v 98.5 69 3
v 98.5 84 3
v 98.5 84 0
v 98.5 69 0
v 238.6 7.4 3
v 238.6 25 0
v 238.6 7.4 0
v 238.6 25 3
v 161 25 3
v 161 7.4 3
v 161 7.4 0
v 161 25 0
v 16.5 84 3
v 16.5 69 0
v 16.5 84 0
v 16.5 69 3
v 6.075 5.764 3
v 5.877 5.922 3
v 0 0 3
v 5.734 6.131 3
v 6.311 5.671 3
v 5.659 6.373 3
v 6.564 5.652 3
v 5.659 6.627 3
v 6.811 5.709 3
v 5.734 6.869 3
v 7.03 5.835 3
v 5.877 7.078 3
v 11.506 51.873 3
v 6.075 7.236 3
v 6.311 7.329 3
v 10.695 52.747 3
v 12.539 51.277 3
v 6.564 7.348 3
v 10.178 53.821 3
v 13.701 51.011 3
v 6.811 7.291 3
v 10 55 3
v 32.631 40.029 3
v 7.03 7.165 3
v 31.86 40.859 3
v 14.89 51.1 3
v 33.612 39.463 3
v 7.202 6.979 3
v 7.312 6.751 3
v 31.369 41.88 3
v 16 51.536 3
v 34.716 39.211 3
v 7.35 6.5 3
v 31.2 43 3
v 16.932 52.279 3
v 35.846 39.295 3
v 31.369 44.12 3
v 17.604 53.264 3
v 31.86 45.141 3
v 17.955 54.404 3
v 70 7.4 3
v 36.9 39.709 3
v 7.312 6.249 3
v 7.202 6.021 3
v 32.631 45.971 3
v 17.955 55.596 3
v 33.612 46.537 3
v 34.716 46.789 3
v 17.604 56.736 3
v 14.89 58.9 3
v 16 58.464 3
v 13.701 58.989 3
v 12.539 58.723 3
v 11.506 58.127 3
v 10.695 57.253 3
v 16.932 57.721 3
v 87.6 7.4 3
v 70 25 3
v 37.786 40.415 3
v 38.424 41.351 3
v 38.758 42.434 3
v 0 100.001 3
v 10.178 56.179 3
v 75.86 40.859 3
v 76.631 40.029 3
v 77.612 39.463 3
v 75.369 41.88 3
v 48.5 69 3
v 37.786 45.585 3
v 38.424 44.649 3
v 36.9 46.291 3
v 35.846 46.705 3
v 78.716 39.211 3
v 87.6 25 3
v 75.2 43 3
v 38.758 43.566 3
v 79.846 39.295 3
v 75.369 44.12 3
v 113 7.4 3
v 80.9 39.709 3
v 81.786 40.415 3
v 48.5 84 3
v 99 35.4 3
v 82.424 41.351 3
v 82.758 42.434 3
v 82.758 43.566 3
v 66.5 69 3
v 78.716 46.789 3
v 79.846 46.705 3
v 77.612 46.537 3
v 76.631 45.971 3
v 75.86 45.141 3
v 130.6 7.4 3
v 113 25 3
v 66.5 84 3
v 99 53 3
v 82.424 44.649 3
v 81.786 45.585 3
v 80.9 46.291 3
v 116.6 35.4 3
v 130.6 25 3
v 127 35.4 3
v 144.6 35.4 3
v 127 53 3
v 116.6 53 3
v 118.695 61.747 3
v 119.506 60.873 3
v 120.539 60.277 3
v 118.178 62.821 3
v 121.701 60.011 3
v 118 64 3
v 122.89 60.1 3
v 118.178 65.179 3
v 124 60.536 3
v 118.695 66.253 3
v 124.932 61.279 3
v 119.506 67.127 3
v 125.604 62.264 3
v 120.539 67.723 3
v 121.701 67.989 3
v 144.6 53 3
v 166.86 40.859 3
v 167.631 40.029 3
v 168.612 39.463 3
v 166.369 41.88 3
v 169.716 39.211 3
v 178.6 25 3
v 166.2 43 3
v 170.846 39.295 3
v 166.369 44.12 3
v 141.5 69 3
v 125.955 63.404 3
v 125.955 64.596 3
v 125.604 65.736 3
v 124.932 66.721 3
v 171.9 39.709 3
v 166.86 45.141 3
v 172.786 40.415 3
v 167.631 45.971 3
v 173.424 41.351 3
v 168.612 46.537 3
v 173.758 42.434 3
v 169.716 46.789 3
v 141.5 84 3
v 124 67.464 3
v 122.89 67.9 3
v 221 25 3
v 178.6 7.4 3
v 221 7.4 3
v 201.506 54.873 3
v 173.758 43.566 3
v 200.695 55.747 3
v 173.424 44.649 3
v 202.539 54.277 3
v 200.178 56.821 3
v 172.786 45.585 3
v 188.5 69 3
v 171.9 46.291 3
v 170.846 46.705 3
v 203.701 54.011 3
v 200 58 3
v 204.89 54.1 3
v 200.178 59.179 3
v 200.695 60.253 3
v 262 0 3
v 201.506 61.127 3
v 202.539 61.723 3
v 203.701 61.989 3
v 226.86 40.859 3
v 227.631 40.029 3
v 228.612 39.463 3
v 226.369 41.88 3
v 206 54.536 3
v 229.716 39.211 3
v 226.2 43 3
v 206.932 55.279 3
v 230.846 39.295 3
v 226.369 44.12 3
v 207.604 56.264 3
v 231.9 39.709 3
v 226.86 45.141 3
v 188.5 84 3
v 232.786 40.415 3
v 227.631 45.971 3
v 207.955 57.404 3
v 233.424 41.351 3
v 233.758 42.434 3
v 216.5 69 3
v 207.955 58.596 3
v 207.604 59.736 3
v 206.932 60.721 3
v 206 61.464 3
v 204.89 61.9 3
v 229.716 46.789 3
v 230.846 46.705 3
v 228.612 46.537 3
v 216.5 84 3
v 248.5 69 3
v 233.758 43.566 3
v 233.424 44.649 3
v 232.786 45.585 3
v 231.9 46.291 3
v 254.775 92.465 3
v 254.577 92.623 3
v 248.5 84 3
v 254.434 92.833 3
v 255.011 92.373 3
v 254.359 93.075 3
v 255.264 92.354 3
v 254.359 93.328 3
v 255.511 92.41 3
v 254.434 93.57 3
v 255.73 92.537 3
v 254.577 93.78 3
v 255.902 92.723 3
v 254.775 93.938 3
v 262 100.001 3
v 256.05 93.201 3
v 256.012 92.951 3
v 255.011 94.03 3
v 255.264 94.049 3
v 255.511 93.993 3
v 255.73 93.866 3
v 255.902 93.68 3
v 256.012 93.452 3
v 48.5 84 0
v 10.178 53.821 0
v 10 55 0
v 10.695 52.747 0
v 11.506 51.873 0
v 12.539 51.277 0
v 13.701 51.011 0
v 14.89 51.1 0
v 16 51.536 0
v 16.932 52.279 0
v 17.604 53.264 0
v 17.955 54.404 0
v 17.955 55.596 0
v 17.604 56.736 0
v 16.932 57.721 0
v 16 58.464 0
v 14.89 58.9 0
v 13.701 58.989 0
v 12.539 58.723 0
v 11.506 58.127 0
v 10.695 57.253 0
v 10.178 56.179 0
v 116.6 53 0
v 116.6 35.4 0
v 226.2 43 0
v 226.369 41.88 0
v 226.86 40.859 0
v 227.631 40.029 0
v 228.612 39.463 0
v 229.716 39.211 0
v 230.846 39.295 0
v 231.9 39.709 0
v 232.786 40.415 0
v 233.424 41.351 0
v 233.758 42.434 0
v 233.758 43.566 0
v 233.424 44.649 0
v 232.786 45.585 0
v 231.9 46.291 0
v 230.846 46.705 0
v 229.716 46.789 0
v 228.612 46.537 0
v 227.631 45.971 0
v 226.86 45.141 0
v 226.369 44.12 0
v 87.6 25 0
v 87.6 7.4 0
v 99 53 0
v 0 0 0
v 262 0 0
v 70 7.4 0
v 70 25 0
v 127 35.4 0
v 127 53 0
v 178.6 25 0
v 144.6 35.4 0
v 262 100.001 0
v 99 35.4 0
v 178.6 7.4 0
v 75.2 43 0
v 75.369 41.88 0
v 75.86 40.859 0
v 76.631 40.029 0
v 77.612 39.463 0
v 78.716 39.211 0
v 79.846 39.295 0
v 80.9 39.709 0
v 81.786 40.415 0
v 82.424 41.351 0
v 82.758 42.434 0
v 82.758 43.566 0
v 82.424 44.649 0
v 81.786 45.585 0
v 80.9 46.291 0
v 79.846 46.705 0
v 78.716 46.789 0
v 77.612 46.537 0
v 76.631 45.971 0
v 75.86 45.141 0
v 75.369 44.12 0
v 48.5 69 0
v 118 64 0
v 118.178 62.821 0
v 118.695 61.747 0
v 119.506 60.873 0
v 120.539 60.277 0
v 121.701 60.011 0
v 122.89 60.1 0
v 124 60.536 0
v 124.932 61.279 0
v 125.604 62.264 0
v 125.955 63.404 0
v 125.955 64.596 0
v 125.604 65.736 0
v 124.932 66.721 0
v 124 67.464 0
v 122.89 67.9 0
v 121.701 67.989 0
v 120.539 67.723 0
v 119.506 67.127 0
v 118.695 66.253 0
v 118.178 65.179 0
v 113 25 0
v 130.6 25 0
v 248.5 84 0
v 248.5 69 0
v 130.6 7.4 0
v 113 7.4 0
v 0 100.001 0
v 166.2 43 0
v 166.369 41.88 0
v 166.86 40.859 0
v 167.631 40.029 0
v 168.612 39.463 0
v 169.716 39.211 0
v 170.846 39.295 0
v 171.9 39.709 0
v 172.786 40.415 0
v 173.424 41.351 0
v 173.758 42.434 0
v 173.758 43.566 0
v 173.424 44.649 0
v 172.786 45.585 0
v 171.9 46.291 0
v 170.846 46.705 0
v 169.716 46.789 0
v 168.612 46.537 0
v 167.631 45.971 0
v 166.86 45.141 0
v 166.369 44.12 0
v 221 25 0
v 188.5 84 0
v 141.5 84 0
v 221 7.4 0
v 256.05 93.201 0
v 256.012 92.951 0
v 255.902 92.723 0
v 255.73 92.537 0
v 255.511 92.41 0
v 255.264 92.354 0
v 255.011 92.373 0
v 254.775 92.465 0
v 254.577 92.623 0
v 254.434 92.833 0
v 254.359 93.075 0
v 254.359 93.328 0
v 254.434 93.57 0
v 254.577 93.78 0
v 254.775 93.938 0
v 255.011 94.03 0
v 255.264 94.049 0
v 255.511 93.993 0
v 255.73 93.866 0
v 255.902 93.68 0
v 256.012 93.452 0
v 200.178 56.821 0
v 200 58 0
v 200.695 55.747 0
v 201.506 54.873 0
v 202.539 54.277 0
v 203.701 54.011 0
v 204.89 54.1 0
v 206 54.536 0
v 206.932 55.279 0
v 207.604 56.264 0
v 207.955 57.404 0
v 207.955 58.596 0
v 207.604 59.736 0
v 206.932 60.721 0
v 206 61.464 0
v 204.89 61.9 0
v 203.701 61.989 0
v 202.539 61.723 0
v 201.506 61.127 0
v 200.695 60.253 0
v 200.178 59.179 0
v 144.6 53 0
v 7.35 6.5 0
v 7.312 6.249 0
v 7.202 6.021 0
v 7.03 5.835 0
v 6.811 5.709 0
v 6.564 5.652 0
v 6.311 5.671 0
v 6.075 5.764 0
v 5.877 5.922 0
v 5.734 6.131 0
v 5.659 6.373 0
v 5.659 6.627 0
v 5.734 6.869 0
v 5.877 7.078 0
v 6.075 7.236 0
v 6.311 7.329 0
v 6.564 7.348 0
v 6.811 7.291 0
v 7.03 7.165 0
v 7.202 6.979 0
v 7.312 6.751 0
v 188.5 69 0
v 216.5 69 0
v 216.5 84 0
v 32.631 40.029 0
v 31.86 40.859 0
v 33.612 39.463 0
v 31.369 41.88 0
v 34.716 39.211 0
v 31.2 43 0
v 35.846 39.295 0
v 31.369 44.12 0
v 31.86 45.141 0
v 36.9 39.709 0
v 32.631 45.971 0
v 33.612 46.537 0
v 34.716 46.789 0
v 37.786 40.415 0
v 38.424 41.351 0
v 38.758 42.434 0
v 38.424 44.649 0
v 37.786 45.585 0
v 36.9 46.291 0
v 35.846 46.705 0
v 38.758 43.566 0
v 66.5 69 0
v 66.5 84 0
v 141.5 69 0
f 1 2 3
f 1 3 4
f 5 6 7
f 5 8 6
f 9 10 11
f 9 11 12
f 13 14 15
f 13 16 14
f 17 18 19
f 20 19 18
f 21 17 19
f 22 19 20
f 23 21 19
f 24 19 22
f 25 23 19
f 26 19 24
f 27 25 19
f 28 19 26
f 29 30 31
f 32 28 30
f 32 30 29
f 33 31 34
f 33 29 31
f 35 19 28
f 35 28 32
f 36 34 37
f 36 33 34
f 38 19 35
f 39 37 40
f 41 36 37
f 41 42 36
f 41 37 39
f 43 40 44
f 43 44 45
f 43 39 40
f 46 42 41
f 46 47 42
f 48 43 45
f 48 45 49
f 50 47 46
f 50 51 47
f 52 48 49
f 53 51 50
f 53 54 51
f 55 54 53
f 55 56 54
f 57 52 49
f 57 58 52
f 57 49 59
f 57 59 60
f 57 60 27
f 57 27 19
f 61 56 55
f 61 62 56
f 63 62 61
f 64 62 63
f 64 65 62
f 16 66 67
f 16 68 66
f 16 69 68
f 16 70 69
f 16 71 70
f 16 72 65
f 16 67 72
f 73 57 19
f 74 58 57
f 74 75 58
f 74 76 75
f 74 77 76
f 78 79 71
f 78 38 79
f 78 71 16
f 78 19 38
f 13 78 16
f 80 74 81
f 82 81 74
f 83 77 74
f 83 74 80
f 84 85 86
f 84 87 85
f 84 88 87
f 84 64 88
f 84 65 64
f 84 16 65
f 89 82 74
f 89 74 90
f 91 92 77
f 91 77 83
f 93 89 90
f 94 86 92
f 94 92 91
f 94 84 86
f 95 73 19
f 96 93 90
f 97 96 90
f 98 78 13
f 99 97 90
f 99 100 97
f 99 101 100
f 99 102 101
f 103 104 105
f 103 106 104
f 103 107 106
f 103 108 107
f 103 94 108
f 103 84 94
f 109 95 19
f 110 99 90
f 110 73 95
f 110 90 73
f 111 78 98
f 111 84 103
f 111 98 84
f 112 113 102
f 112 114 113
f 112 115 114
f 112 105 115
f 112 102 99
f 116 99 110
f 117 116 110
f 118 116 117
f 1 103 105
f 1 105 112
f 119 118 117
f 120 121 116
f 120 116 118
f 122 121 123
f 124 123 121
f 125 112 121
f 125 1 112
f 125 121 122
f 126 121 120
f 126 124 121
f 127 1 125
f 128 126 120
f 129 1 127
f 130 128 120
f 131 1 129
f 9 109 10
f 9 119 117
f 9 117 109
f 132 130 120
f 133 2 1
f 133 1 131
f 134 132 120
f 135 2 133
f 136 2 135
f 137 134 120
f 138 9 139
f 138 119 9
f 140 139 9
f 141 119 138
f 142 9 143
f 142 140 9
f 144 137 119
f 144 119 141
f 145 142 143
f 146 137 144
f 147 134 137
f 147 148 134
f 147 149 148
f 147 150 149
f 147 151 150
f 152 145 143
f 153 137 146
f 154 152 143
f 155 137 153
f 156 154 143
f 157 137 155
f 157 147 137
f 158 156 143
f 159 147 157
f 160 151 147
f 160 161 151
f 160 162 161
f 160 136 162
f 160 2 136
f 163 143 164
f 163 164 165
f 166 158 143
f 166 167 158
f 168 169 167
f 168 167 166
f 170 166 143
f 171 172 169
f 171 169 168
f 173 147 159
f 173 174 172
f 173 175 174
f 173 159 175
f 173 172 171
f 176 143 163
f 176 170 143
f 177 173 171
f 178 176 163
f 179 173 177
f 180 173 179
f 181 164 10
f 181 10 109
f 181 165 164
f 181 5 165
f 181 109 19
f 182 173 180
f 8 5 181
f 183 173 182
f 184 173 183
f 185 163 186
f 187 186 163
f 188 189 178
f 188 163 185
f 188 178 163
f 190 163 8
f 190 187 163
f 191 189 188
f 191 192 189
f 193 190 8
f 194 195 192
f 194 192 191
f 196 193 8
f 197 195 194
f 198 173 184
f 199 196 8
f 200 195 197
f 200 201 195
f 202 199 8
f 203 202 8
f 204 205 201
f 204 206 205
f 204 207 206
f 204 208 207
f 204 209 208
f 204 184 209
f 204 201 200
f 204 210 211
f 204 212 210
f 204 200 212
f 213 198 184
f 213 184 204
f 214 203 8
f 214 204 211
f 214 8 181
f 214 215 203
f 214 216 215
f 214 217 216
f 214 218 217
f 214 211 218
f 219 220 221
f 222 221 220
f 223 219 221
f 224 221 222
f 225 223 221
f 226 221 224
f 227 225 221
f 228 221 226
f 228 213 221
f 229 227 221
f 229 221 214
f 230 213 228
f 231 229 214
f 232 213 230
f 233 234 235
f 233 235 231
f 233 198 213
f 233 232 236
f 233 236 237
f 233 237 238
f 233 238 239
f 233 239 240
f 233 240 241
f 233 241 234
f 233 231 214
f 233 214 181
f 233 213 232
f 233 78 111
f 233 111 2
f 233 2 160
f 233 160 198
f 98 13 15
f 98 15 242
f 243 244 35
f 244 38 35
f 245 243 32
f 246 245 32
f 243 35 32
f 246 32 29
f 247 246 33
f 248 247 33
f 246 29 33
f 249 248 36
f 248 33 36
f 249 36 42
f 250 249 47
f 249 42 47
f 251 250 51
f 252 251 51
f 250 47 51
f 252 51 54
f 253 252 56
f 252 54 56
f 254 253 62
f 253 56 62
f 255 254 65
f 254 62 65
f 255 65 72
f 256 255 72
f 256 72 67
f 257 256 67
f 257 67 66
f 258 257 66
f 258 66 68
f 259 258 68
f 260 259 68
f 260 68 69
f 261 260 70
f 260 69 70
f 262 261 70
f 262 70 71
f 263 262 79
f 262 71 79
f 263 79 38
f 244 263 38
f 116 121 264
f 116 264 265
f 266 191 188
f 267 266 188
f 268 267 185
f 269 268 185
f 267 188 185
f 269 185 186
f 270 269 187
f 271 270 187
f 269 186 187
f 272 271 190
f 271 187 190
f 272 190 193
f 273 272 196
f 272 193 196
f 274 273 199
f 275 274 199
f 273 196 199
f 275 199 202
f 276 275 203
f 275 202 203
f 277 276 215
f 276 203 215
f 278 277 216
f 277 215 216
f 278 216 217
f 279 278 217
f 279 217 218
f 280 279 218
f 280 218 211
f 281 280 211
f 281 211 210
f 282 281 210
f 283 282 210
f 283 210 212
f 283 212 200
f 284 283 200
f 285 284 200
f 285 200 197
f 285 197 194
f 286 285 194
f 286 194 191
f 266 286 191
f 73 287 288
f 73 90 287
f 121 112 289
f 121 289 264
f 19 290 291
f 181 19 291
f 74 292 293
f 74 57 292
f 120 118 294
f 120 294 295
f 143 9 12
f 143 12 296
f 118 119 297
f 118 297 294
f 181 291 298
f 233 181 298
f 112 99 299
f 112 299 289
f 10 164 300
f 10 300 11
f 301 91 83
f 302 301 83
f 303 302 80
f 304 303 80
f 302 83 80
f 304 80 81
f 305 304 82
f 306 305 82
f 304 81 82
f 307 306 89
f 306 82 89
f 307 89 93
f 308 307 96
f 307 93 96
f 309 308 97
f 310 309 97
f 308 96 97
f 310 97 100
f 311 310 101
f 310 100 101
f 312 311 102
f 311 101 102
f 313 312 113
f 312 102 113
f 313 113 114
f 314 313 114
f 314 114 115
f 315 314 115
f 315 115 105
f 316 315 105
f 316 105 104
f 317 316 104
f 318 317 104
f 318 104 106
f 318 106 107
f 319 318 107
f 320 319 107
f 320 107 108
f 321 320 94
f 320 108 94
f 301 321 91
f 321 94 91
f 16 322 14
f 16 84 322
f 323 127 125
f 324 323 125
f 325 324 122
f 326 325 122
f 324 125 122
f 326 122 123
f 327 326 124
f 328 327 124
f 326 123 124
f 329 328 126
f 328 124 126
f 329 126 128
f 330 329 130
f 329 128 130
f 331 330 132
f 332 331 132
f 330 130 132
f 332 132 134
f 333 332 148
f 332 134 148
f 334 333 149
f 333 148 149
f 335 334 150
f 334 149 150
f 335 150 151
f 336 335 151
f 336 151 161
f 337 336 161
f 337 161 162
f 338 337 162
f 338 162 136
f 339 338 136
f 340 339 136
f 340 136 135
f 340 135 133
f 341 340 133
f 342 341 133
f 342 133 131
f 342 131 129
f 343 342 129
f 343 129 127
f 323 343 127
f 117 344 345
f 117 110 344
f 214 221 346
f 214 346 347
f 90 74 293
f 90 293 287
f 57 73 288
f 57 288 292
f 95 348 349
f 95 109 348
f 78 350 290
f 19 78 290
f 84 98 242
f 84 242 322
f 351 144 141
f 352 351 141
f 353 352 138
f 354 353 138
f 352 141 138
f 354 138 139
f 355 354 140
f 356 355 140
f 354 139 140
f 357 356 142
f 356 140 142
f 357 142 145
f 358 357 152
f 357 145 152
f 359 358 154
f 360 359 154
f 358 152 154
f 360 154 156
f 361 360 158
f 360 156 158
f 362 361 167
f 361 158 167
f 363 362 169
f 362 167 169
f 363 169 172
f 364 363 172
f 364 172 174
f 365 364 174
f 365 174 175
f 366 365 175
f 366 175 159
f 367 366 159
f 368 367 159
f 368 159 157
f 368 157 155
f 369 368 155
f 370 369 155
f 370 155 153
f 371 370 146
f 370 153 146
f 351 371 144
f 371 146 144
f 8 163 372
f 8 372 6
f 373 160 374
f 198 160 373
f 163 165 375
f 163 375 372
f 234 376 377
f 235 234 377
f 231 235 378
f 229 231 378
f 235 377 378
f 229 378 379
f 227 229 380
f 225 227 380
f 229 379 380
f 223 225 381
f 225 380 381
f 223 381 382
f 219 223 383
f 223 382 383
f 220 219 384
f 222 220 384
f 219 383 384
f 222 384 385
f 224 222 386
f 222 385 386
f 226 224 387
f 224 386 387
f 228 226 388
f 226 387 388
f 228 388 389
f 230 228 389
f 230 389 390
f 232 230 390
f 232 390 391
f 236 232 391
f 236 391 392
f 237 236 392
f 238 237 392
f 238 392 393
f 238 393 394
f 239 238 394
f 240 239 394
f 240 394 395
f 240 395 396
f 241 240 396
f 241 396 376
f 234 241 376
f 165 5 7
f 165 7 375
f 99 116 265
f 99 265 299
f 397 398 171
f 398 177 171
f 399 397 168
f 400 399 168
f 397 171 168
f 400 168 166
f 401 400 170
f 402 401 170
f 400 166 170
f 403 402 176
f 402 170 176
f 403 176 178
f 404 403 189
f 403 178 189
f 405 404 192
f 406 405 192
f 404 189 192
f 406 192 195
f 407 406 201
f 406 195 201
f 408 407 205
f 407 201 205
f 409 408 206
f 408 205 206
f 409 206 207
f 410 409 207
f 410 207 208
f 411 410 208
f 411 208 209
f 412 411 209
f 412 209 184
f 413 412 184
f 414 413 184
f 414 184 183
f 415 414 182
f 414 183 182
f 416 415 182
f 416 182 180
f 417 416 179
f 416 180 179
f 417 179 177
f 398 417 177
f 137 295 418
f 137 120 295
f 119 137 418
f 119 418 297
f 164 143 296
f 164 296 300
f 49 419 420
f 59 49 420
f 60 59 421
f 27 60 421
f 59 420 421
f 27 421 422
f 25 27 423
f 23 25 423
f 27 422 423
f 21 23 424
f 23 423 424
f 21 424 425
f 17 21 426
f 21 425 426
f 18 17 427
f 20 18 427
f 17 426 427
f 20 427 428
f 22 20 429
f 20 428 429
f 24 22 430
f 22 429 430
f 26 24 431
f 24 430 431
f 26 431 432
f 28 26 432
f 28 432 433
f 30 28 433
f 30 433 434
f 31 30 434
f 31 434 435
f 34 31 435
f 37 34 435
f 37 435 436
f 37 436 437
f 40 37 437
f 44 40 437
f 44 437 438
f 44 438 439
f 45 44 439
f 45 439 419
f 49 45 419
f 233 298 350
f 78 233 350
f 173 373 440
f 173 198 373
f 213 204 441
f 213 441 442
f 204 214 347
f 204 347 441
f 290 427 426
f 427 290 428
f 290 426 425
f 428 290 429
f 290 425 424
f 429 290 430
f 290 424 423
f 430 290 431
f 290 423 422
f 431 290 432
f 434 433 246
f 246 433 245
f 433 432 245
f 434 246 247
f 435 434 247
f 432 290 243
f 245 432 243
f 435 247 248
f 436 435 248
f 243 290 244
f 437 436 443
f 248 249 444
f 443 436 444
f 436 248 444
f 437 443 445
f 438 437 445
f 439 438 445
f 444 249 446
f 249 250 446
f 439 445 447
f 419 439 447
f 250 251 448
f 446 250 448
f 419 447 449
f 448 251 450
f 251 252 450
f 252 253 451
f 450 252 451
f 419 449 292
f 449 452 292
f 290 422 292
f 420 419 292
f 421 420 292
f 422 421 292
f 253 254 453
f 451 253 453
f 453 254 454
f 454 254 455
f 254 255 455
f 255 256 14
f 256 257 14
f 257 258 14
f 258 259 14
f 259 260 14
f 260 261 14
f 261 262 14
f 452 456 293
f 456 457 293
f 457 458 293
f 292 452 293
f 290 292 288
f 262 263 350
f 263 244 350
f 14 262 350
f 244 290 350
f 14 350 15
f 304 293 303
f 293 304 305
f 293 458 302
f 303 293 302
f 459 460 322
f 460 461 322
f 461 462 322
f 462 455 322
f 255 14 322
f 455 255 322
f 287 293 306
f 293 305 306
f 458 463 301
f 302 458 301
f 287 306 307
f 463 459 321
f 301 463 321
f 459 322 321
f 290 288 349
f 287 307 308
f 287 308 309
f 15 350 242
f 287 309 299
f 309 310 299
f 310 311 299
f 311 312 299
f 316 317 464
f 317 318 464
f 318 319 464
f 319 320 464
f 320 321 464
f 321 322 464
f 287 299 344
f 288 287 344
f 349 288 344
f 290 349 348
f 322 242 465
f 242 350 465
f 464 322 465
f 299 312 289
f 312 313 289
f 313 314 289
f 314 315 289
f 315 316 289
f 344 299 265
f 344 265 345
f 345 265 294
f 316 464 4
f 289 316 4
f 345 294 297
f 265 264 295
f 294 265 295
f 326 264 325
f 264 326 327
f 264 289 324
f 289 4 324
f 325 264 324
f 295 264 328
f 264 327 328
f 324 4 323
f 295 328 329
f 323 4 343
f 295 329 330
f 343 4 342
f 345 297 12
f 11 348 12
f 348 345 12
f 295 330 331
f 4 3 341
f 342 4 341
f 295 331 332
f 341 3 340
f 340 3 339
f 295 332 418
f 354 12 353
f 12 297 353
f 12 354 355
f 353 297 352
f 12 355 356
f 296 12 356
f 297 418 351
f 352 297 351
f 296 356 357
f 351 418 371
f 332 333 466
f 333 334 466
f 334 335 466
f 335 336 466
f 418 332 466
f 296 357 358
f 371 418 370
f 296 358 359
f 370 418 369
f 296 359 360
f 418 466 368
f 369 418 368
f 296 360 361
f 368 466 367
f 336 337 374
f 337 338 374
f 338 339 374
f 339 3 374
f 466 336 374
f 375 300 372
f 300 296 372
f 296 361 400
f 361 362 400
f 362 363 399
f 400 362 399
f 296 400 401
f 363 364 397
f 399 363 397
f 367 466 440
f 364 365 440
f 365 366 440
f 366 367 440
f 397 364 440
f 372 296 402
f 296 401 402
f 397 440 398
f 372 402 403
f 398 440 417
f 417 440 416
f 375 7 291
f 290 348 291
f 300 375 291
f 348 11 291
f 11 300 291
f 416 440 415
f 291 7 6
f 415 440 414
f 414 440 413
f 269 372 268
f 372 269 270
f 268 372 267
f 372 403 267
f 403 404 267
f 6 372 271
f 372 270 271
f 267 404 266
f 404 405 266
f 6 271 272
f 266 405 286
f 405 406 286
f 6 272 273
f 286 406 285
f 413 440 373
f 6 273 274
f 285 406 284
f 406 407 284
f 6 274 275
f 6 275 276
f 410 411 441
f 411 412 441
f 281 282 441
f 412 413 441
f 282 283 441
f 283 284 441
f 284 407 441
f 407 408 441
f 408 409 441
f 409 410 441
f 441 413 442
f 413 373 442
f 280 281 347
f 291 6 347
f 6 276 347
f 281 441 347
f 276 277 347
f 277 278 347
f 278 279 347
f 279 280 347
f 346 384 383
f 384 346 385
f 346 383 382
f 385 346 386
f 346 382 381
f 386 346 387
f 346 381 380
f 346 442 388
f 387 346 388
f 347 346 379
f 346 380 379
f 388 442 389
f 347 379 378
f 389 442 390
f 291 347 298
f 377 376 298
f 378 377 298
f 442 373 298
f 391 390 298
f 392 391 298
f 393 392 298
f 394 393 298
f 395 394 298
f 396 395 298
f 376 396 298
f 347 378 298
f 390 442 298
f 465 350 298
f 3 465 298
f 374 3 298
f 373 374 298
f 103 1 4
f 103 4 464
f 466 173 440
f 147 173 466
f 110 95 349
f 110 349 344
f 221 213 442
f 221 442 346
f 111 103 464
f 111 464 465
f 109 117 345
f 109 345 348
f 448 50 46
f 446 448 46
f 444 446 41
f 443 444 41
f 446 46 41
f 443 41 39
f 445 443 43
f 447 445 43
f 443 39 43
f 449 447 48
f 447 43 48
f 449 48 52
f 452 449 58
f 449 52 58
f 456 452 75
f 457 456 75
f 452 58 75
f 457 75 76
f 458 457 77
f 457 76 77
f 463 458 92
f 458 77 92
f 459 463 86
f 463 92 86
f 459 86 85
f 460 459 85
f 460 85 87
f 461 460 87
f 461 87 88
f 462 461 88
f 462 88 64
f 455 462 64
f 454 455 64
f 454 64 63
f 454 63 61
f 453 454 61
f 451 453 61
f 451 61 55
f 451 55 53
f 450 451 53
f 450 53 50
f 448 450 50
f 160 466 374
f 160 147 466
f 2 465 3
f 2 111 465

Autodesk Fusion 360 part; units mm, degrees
sketch "Sketch1" plane through (0, 0, 0) normal (0, 0, 1) x (1, 0, 0)
  line L0 (0, 0) -> (262, 0)
  line L1 (262, 0) -> (262, 100.0014)
  line L2 (262, 100.0014) -> (0, 100.0014)
  line L3 (0, 100.0014) -> (0, 0)
extrude "Extrude1" add sketch "Sketch1" along normal blind 3
sketch "Sketch2" plane through (0, 0, 3) normal (0, 0, 1) x (-1, 0, 0)
  line L0 (0, -100.0014) -> (0, 0)
  line L1 (0, 0) -> (-262, 0)
  line L2 (-262, 0) -> (-262, -100.0014)
  line L3 (-262, -100.0014) -> (0, -100.0014)
  line L4 (-141.5, -69) -> (-141.5, -84)
  line L5 (-188.5, -84) -> (-188.5, -69)
  line L6 (-141.5, -84) -> (-188.5, -84)
  line L7 (-188.5, -69) -> (-141.5, -69)
  line L8 (-216.5, -84) -> (-248.5, -84)
  line L9 (-216.5, -69) -> (-216.5, -84)
  line L10 (-248.5, -69) -> (-216.5, -69)
  line L11 (-248.5, -84) -> (-248.5, -69)
  line L12 (-16.5, -84) -> (-48.5, -84)
  line L13 (-48.5, -84) -> (-48.5, -69)
  line L14 (-16.5, -69) -> (-16.5, -84)
  line L15 (-48.5, -69) -> (-16.5, -69)
  line L16 (-98.5, -69) -> (-66.5, -69)
  line L17 (-98.5, -84) -> (-98.5, -69)
  line L18 (-66.5, -84) -> (-98.5, -84)
  line L19 (-66.5, -69) -> (-66.5, -84)
  line L20 (-113, -25) -> (-130.6, -25)
  line L21 (-130.6, -25) -> (-130.6, -7.4)
  line L22 (-130.6, -7.4) -> (-113, -7.4)
  line L23 (-113, -7.4) -> (-113, -25)
  line L24 (-144.6, -53) -> (-144.6, -35.4)
  line L25 (-127, -53) -> (-144.6, -53)
  line L26 (-127, -35.4) -> (-127, -53)
  line L27 (-144.6, -35.4) -> (-127, -35.4)
  line L28 (-116.6, -53) -> (-116.6, -35.4)
  line L29 (-99, -53) -> (-116.6, -53)
  line L30 (-99, -35.4) -> (-99, -53)
  line L31 (-116.6, -35.4) -> (-99, -35.4)
  circle A0 centre (-35, -43) radius 3.8
  circle A1 centre (-79, -43) radius 3.8
  circle A2 centre (-170, -43) radius 3.8
  circle A3 centre (-230, -43) radius 3.8
  circle A4 centre (-122, -64) radius 4
  circle A5 centre (-14, -55) radius 4
  circle A6 centre (-204, -58) radius 4
  line L32 (-87.6, -25) -> (-87.6, -7.4)
  line L33 (-70, -25) -> (-87.6, -25)
  line L34 (-70, -7.4) -> (-70, -25)
  line L35 (-87.6, -7.4) -> (-70, -7.4)
  line L36 (-178.6, -25) -> (-178.6, -7.4)
  line L37 (-161, -25) -> (-178.6, -25)
  line L38 (-161, -7.4) -> (-161, -25)
  line L39 (-178.6, -7.4) -> (-161, -7.4)
  line L40 (-238.6, -25) -> (-238.6, -7.4)
  line L41 (-221, -25) -> (-238.6, -25)
  line L42 (-221, -7.4) -> (-221, -25)
  line L43 (-238.6, -7.4) -> (-221, -7.4)
  point P0 (-56, -93.0014)
  dimension "d15" = 47
  dimension "d16" = 15
  dimension "d17" = 32
  dimension "d18" = 15
  dimension "d19" = 32
  dimension "d20" = 15
  dimension "d21" = 32
  dimension "d22" = 15
  dimension "d24" = 17.6
  dimension "d25" = 17.6
  dimension "d26" = 17.6
  dimension "d27" = 17.6
  dimension "d28" = 17.6
  dimension "d29" = 17.6
  dimension "d31" = 7.6
  dimension "d32" = 7.6
  dimension "d33" = 7.6
  dimension "d34" = 7.6
  dimension "d35" = 8
  dimension "d36" = 8
  dimension "d37" = 8
  dimension "d38" = 17.6
  dimension "d39" = 17.6
  dimension "d40" = 17.6
  dimension "d41" = 17.6
  dimension "d42" = 17.6
  dimension "d43" = 17.6
extrude "Extrude2" cut sketch "Sketch2" against normal blind 20 contours L4 L5 L6 L7 | L8 L9 L10 L11 | L12 L13 L14 L15 | L16 L17 L18 L19 | L20 L21 L22 L23 | L24 L25 L26 L27 | L28 L29 L30 L31 | A0 | A1 | A2 | A3 | A4 | A5 | A6 | L32 L33 L34 L35 | L36 L37 L38 L39 | L40 L41 L42 L43
sketch "Sketch3" plane through (0, 0, 0) normal (0, 0, -1) x (1, 0, 0)
  circle A0 centre (170, -43) radius 3.8
  line L0 (216.5, -84) -> (216.5, -69)
  line L1 (216.5, -69) -> (248.5, -69)
  line L2 (248.5, -69) -> (248.5, -84)
  line L3 (248.5, -84) -> (216.5, -84)
  line L4 (130.6, -7.4) -> (130.6, -25)
  line L5 (130.6, -25) -> (113, -25)
  line L6 (113, -25) -> (113, -7.4)
  line L7 (113, -7.4) -> (130.6, -7.4)
  line L8 (98.5, -69) -> (98.5, -84)
  line L9 (98.5, -84) -> (66.5, -84)
  line L10 (66.5, -84) -> (66.5, -69)
  line L11 (66.5, -69) -> (98.5, -69)
  line L12 (116.6, -53) -> (99, -53)
  line L13 (99, -53) -> (99, -35.4)
  line L14 (99, -35.4) -> (116.6, -35.4)
  line L15 (116.6, -35.4) -> (116.6, -53)
  line L16 (87.6, -25) -> (70, -25)
  line L17 (70, -25) -> (70, -7.4)
  line L18 (70, -7.4) -> (87.6, -7.4)
  line L19 (87.6, -7.4) -> (87.6, -25)
  line L20 (188.5, -84) -> (141.5, -84)
  line L21 (141.5, -84) -> (141.5, -69)
  line L22 (141.5, -69) -> (188.5, -69)
  line L23 (188.5, -69) -> (188.5, -84)
  circle A1 centre (204, -58) radius 4
  circle A2 centre (35, -43) radius 3.8
  line L24 (238.6, -25) -> (221, -25)
  line L25 (221, -25) -> (221, -7.4)
  line L26 (221, -7.4) -> (238.6, -7.4)
  line L27 (238.6, -7.4) -> (238.6, -25)
  line L28 (144.6, -53) -> (127, -53)
  line L29 (127, -53) -> (127, -35.4)
  line L30 (127, -35.4) -> (144.6, -35.4)
  line L31 (144.6, -35.4) -> (144.6, -53)
  circle A3 centre (79, -43) radius 3.8
  circle A4 centre (122, -64) radius 4
  line L32 (48.5, -84) -> (16.5, -84)
  line L33 (16.5, -84) -> (16.5, -69)
  line L34 (16.5, -69) -> (48.5, -69)
  line L35 (48.5, -69) -> (48.5, -84)
  line L36 (178.6, -25) -> (161, -25)
  line L37 (161, -25) -> (161, -7.4)
  line L38 (161, -7.4) -> (178.6, -7.4)
  line L39 (178.6, -7.4) -> (178.6, -25)
  circle A5 centre (230, -43) radius 3.8
  circle A6 centre (14, -55) radius 4
  line L40 (0, 0) -> (0, -100.0014)
  line L41 (0, -100.0014) -> (262, -100.0014)
  line L42 (262, -100.0014) -> (262, 0)
  line L43 (262, 0) -> (0, 0)
  circle A7 centre (6.5, -6.5) radius 0.85
  dimension "d46" = 1.7
extrude "Extrude3" cut sketch "Sketch3" against normal blind 4 contours A7
sketch "Sketch4" plane through (0, 0, 0) normal (0, 0, -1) x (1, 0, 0)
  circle A0 centre (6.5, -6.5) radius 0.85
  circle A1 centre (170, -43) radius 3.8
  line L0 (216.5, -84) -> (216.5, -69)
  line L1 (216.5, -69) -> (248.5, -69)
  line L2 (248.5, -69) -> (248.5, -84)
  line L3 (248.5, -84) -> (216.5, -84)
  line L4 (130.6, -7.4) -> (130.6, -25)
  line L5 (130.6, -25) -> (113, -25)
  line L6 (113, -25) -> (113, -7.4)
  line L7 (113, -7.4) -> (130.6, -7.4)
  line L8 (98.5, -69) -> (98.5, -84)
  line L9 (98.5, -84) -> (66.5, -84)
  line L10 (66.5, -84) -> (66.5, -69)
  line L11 (66.5, -69) -> (98.5, -69)
  line L12 (116.6, -53) -> (99, -53)
  line L13 (99, -53) -> (99, -35.4)
  line L14 (99, -35.4) -> (116.6, -35.4)
  line L15 (116.6, -35.4) -> (116.6, -53)
  line L16 (87.6, -25) -> (70, -25)
  line L17 (70, -25) -> (70, -7.4)
  line L18 (70, -7.4) -> (87.6, -7.4)
  line L19 (87.6, -7.4) -> (87.6, -25)
  line L20 (188.5, -84) -> (141.5, -84)
  line L21 (141.5, -84) -> (141.5, -69)
  line L22 (141.5, -69) -> (188.5, -69)
  line L23 (188.5, -69) -> (188.5, -84)
  circle A2 centre (204, -58) radius 4
  circle A3 centre (35, -43) radius 3.8
  line L24 (238.6, -25) -> (221, -25)
  line L25 (221, -25) -> (221, -7.4)
  line L26 (221, -7.4) -> (238.6, -7.4)
  line L27 (238.6, -7.4) -> (238.6, -25)
  line L28 (144.6, -53) -> (127, -53)
  line L29 (127, -53) -> (127, -35.4)
  line L30 (127, -35.4) -> (144.6, -35.4)
  line L31 (144.6, -35.4) -> (144.6, -53)
  circle A4 centre (79, -43) radius 3.8
  circle A5 centre (122, -64) radius 4
  line L32 (48.5, -84) -> (16.5, -84)
  line L33 (16.5, -84) -> (16.5, -69)
  line L34 (16.5, -69) -> (48.5, -69)
  line L35 (48.5, -69) -> (48.5, -84)
  line L36 (178.6, -25) -> (161, -25)
  line L37 (161, -25) -> (161, -7.4)
  line L38 (161, -7.4) -> (178.6, -7.4)
  line L39 (178.6, -7.4) -> (178.6, -25)
  circle A6 centre (230, -43) radius 3.8
  circle A7 centre (14, -55) radius 4
  line L40 (0, 0) -> (0, -100.0014)
  line L41 (0, -100.0014) -> (262, -100.0014)
  line L42 (262, -100.0014) -> (262, 0)
  line L43 (262, 0) -> (0, 0)
  circle A8 centre (255.2, -93.2014) radius 0.85
  dimension "d49" = 1.7
extrude "Extrude4" cut sketch "Sketch4" against normal blind 5 contours A8
